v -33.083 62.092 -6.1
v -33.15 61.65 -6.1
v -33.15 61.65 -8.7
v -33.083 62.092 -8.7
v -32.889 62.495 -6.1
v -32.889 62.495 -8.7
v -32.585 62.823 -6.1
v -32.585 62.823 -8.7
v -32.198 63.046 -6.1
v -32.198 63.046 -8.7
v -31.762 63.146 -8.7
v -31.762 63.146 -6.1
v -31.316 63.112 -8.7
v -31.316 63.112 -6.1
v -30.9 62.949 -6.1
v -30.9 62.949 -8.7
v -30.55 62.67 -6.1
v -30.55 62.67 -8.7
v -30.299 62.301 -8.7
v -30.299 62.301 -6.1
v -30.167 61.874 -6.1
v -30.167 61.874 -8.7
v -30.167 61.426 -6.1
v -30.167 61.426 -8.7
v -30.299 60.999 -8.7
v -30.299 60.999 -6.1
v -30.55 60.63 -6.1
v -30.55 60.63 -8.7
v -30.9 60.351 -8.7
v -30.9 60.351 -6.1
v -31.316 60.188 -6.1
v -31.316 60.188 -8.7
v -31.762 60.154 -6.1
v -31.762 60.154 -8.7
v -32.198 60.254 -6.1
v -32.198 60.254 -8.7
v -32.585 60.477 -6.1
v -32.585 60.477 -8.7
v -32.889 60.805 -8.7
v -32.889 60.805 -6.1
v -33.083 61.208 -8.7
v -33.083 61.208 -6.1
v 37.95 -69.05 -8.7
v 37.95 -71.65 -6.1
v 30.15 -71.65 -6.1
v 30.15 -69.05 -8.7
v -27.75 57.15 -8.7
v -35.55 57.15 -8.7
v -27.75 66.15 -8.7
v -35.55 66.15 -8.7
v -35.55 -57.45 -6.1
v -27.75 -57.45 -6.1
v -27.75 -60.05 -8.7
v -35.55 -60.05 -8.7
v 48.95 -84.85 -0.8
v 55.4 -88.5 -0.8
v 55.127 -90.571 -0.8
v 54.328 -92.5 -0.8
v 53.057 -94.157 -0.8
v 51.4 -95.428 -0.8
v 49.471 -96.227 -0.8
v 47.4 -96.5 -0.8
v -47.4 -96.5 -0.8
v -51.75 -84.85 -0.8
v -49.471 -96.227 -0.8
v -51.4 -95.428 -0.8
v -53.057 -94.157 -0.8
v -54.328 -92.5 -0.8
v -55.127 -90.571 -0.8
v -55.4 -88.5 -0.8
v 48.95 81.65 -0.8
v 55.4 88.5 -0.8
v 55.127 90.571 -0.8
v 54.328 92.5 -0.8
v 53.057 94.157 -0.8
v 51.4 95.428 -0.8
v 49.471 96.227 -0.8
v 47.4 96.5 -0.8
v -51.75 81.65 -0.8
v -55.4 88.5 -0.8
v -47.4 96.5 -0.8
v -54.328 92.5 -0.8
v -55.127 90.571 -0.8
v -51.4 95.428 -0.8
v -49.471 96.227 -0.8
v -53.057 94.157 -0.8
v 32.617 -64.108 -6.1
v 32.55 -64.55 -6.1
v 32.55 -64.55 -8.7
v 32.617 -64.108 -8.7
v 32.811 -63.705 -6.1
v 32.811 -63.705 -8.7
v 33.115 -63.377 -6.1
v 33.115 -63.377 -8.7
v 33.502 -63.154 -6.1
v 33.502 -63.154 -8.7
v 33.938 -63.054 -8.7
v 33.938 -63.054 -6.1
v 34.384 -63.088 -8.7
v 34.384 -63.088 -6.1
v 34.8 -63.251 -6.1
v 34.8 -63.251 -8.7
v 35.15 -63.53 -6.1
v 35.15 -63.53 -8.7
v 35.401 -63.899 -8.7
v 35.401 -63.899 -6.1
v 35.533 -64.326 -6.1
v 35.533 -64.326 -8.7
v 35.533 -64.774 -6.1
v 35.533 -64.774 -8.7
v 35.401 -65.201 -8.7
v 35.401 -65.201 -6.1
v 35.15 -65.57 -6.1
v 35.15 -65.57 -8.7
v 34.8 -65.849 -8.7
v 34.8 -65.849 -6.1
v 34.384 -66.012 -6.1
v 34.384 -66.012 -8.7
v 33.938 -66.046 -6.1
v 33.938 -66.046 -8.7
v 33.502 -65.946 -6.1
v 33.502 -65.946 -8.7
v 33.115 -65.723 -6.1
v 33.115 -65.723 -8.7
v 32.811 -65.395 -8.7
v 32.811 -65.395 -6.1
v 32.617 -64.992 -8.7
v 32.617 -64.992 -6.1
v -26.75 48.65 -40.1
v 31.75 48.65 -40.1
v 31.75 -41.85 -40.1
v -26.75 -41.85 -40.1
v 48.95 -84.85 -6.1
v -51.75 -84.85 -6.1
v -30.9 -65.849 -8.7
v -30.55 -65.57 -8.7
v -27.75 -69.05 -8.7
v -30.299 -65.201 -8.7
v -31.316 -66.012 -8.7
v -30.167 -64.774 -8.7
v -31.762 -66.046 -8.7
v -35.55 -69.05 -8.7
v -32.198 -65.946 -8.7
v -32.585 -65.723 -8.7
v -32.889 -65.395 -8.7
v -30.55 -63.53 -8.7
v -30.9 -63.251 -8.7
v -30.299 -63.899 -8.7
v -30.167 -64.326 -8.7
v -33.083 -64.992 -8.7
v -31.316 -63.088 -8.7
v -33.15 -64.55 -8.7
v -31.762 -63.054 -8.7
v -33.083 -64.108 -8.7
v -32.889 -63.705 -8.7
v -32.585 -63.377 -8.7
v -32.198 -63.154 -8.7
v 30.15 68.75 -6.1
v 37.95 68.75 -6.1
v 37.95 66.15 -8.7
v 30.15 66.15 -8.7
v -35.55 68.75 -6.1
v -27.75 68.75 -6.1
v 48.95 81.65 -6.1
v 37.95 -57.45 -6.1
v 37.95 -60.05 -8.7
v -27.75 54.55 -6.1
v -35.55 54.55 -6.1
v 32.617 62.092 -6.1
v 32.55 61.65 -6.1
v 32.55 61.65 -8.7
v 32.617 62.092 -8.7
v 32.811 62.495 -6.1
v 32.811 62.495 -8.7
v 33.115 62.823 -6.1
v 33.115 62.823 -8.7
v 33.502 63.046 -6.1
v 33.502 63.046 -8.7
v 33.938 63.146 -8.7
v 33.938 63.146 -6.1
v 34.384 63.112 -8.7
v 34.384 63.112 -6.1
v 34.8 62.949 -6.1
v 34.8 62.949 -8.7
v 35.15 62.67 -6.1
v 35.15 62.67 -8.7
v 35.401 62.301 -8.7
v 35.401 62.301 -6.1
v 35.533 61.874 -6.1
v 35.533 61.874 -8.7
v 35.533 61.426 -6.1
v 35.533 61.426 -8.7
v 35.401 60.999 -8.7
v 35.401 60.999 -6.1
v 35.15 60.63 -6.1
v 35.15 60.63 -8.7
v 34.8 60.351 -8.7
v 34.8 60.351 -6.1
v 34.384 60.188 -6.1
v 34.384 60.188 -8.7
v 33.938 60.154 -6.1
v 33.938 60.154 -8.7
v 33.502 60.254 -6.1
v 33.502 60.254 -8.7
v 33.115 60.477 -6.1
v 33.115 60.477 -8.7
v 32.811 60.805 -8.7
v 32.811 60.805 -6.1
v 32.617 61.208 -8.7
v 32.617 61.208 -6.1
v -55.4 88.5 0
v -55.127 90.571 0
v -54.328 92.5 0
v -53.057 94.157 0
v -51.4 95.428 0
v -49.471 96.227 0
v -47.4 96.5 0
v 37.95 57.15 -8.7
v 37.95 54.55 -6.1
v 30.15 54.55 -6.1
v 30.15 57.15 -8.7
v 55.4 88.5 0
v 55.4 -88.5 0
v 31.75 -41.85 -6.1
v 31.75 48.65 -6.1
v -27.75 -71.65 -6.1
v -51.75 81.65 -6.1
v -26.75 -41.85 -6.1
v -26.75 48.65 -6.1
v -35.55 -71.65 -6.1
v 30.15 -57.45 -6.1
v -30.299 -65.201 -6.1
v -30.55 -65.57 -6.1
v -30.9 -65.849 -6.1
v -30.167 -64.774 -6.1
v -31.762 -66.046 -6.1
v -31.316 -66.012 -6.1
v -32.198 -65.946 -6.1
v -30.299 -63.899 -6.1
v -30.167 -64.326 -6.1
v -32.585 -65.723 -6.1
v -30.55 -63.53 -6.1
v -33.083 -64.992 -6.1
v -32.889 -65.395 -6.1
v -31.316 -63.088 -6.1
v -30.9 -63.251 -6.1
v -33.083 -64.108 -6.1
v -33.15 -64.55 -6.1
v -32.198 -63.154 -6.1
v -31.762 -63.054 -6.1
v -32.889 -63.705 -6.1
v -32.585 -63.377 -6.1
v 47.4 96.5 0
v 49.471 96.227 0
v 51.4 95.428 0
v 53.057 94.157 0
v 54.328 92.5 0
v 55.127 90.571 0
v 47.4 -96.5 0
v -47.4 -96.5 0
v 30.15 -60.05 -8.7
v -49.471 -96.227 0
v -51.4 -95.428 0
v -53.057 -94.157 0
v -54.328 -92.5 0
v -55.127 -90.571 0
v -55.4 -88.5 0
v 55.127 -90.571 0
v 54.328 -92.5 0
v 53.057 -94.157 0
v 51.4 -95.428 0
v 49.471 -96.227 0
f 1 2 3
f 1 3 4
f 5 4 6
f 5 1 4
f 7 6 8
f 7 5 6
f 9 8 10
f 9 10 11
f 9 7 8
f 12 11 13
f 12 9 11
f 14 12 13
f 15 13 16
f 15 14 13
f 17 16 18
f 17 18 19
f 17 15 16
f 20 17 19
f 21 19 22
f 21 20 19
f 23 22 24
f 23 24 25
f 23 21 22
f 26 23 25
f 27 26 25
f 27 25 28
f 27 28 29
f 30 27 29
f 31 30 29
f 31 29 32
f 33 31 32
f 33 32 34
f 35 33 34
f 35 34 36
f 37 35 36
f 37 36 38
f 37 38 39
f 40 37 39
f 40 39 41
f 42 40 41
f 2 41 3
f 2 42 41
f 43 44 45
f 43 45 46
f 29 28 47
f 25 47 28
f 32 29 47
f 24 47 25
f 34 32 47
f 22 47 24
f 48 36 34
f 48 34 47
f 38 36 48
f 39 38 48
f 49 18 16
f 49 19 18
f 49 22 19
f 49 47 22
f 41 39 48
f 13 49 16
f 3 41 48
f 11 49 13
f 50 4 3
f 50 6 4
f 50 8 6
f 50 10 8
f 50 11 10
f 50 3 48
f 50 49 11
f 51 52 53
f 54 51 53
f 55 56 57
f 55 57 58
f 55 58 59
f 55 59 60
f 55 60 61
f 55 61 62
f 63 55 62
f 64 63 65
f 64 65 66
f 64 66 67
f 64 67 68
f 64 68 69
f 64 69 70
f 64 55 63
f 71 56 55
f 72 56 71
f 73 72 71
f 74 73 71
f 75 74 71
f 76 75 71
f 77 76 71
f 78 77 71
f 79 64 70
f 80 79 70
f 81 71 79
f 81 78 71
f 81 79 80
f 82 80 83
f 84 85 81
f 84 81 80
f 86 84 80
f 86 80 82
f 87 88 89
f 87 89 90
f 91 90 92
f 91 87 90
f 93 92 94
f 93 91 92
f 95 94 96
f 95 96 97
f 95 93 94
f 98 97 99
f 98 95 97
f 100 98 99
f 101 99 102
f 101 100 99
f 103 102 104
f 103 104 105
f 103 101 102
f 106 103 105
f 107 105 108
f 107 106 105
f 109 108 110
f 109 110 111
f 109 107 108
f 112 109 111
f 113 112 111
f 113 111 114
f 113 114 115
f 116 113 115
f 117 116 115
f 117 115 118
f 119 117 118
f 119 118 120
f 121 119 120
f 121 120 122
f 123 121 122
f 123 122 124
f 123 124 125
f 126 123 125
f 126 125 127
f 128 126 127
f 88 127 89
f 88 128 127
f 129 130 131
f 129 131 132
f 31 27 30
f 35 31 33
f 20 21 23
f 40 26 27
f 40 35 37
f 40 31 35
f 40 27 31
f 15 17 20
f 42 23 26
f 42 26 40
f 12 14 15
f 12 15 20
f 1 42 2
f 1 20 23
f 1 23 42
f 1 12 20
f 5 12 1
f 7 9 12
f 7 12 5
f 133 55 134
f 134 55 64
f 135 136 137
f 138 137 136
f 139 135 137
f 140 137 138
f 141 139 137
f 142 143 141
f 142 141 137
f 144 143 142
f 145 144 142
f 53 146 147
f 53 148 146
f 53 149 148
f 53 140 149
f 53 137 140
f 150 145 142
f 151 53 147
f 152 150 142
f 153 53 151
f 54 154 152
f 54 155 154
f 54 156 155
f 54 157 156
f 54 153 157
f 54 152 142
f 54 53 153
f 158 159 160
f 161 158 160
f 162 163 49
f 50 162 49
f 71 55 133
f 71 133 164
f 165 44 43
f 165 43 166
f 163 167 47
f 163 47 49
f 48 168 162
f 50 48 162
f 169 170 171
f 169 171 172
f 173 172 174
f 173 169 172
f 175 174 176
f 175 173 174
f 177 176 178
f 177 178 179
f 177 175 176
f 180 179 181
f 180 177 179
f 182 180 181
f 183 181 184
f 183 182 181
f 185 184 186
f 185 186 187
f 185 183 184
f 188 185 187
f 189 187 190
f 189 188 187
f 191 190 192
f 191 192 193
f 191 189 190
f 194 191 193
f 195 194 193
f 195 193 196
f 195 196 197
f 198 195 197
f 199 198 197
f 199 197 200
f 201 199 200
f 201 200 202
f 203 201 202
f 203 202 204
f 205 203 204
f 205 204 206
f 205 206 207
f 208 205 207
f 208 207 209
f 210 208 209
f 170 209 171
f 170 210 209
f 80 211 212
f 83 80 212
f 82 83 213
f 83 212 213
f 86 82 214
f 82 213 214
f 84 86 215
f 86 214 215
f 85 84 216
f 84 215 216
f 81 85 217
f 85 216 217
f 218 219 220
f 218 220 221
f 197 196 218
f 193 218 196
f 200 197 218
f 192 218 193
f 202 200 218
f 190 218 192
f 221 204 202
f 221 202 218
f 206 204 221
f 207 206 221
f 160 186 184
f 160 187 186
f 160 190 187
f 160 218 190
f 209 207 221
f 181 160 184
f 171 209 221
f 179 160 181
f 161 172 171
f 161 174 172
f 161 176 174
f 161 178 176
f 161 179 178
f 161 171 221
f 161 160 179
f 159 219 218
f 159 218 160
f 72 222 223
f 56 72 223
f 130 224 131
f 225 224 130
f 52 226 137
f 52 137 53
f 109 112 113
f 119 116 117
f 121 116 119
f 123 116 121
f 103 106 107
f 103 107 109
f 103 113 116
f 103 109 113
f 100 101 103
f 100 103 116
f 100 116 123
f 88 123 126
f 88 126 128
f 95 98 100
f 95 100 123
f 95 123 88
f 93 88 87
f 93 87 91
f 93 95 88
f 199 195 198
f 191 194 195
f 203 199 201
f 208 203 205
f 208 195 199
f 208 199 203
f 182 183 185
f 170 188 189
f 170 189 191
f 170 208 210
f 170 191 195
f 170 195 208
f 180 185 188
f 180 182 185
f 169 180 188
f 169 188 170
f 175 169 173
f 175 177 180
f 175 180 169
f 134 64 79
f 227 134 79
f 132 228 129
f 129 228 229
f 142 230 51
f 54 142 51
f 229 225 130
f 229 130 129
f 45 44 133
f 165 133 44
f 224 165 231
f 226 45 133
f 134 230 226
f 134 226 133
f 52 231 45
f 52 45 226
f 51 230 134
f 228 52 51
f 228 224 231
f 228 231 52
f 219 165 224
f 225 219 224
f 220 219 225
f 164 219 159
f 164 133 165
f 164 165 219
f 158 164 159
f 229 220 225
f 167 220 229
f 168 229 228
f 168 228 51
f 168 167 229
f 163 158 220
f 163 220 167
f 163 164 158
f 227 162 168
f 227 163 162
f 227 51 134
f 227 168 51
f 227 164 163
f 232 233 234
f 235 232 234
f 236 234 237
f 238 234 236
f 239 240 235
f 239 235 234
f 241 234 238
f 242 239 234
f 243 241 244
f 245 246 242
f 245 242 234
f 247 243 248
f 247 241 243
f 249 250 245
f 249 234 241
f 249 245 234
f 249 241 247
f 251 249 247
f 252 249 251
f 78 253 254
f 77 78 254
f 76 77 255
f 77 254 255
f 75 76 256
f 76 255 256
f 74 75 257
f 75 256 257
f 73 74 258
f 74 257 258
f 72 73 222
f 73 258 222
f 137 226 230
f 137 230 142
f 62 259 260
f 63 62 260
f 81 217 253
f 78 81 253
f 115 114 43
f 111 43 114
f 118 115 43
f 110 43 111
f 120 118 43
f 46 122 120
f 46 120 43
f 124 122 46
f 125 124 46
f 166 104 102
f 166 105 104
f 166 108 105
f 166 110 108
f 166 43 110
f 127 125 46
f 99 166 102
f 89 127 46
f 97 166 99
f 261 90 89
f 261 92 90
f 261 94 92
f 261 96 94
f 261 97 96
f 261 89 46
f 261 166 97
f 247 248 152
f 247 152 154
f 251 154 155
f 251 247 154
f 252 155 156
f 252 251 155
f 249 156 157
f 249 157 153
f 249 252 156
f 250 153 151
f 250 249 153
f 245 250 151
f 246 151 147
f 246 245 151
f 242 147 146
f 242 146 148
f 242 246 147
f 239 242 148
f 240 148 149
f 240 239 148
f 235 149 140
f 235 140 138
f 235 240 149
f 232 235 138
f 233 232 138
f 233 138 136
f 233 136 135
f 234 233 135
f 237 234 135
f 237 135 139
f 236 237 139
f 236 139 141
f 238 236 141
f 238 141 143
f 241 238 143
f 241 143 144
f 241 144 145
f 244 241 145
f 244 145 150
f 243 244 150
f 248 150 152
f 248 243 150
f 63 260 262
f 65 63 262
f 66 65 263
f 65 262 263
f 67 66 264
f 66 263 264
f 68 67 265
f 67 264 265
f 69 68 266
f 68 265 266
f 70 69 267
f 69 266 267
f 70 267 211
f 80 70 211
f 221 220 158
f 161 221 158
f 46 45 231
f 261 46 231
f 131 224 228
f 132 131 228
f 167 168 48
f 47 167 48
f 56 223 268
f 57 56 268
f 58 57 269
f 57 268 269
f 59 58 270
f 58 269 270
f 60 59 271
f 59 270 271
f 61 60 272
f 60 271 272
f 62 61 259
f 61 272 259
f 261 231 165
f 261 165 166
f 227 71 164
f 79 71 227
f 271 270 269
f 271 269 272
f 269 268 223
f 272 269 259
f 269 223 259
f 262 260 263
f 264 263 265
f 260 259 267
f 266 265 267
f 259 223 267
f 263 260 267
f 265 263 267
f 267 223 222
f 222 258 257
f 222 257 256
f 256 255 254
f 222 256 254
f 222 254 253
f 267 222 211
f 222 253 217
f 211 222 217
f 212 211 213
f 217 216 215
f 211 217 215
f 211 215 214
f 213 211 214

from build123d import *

# Parameters (mm, degrees)
BOSS_EXTRUDE1_DEPTH = 0.8
SKETCH2_W           = 100.7
SKETCH2_H           = 166.5
BOSS_EXTRUDE2_DEPTH = 5.3
SKETCH3_W           = 7.8
SKETCH3_H           = 15
SKETCH3_R           = 1.5
BOSS_EXTRUDE3_DEPTH = 2.6
SKETCH4_W           = 58.5
SKETCH4_H           = 90.5
BOSS_EXTRUDE4_DEPTH = 34
CHAMFER1_SIZE       = 3


with BuildPart() as part:
    # Sketch1 → Boss-Extrude1 (new body)
    with BuildSketch(Plane.XY):
        with BuildLine():
            Line((47.4, -96.5), (-47.4, -96.5))
            ThreePointArc((-47.4, -96.5), (-53.056854249, -94.156854249), (-55.4, -88.5))
            Line((-55.4, -88.5), (-55.4, 88.5))
            ThreePointArc((-55.4, 88.5), (-53.056854249, 94.156854249), (-47.4, 96.5))
            Line((-47.4, 96.5), (47.4, 96.5))
            ThreePointArc((47.4, 96.5), (53.056854249, 94.156854249), (55.4, 88.5))
            Line((55.4, 88.5), (55.4, -88.5))
            ThreePointArc((55.4, -88.5), (53.056854249, -94.156854249), (47.4, -96.5))
        make_face()
    extrude(amount=-BOSS_EXTRUDE1_DEPTH)

    # Sketch2 → Boss-Extrude2 (add)
    with BuildSketch(Plane(origin=(0, 0, -0.8), x_dir=(-1, 0, 0), z_dir=(0, 0, -1))):
        with Locations((1.4, -1.6)):
            Rectangle(SKETCH2_W, SKETCH2_H)
    extrude(amount=BOSS_EXTRUDE2_DEPTH)

    # Sketch3 → Boss-Extrude3 (add)
    # profile 1 of 4: a face of its own
    with BuildSketch(Plane(origin=(0, 0, -6.1), x_dir=(-1, 0, 0), z_dir=(0, 0, -1))):
        with Locations((-34.05, 61.65)):
            Rectangle(SKETCH3_W, SKETCH3_H)
        with Locations((-34.05, 61.65)):
            Circle(SKETCH3_R, mode=Mode.SUBTRACT)
    # profile 2 of 4: a face of its own
    with BuildSketch(Plane(origin=(0, 0, -6.1), x_dir=(-1, 0, 0), z_dir=(0, 0, -1))):
        with Locations((31.65, 61.65)):
            Rectangle(SKETCH3_W, SKETCH3_H)
        with Locations((31.65, 61.65)):
            Circle(SKETCH3_R, mode=Mode.SUBTRACT)
    # profile 3 of 4: a face of its own
    with BuildSketch(Plane(origin=(0, 0, -6.1), x_dir=(-1, 0, 0), z_dir=(0, 0, -1))):
        with Locations((-34.05, -64.55)):
            Rectangle(SKETCH3_W, SKETCH3_H)
        with Locations((-34.05, -64.55)):
            Circle(SKETCH3_R, mode=Mode.SUBTRACT)
    # profile 4 of 4: a face of its own
    with BuildSketch(Plane(origin=(0, 0, -6.1), x_dir=(-1, 0, 0), z_dir=(0, 0, -1))):
        with Locations((31.65, -64.55)):
            Rectangle(SKETCH3_W, SKETCH3_H)
        with Locations((31.65, -64.55)):
            Circle(SKETCH3_R, mode=Mode.SUBTRACT)
    extrude(amount=BOSS_EXTRUDE3_DEPTH)

    # Sketch4 → Boss-Extrude4 (add)
    with BuildSketch(Plane(origin=(0, 0, -6.1), x_dir=(-1, 0, 0), z_dir=(0, 0, -1))):
        with Locations((-2.5, 3.4)):
            Rectangle(SKETCH4_W, SKETCH4_H)
    extrude(amount=BOSS_EXTRUDE4_DEPTH)

    # Chamfer1
    # the kernel refuses this chamfer: 3 mm, written as the material it takes off along each edge
    with BuildSketch(Plane(origin=(-20.034951036, -72.05, -8.7), x_dir=(0, -0.027495876610586775, 0.9996219169112968), z_dir=(-1, 0, 0))) as chamfer1_piece_1_section:
        Polygon((CHAMFER1_SIZE * 0.999621916911, CHAMFER1_SIZE * 0.0274958766106), (-CHAMFER1_SIZE * 0.0274958766106, CHAMFER1_SIZE * 0.999621916911), (0, 0), align=None)
    chamfer1_piece_1 = extrude(amount=23.230097928, mode=Mode.PRIVATE)
    chamfer1_piece_1 = split(chamfer1_piece_1, bisect_by=Plane(origin=(-31.65, -71.03377063, -6.1), z_dir=(0, 0, -1)), keep=Keep.TOP, mode=Mode.PRIVATE)
    add(chamfer1_piece_1, mode=Mode.SUBTRACT)
    with BuildSketch(Plane(origin=(-43.265048964, -57.05, -8.7), x_dir=(0, 0.027495876610586775, 0.9996219169112968), z_dir=(1, 0, 0))) as chamfer1_piece_2_section:
        Polygon((CHAMFER1_SIZE * 0.999621916911, CHAMFER1_SIZE * 0.0274958766106), (-CHAMFER1_SIZE * 0.0274958766106, CHAMFER1_SIZE * 0.999621916911), (0, 0), align=None)
    chamfer1_piece_2 = extrude(amount=23.230097928, mode=Mode.PRIVATE)
    chamfer1_piece_2 = split(chamfer1_piece_2, bisect_by=Plane(origin=(-31.65, -58.06622937, -6.1), z_dir=(0, 0, -1)), keep=Keep.TOP, mode=Mode.PRIVATE)
    add(chamfer1_piece_2, mode=Mode.SUBTRACT)
    with BuildSketch(Plane(origin=(22.434951036, -72.05, -8.7), x_dir=(0, -0.027495876610586775, 0.9996219169112968), z_dir=(1, 0, 0))) as chamfer1_piece_3_section:
        Polygon((CHAMFER1_SIZE * 0.999621916911, -CHAMFER1_SIZE * 0.0274958766106), (-CHAMFER1_SIZE * 0.0274958766106, -CHAMFER1_SIZE * 0.999621916911), (0, 0), align=None)
    chamfer1_piece_3 = extrude(amount=23.230097928, mode=Mode.PRIVATE)
    chamfer1_piece_3 = split(chamfer1_piece_3, bisect_by=Plane(origin=(34.05, -71.03377063, -6.1), z_dir=(0, 0, -1)), keep=Keep.TOP, mode=Mode.PRIVATE)
    add(chamfer1_piece_3, mode=Mode.SUBTRACT)
    with BuildSketch(Plane(origin=(45.665048964, -57.05, -8.7), x_dir=(0, 0.027495876610586775, 0.9996219169112968), z_dir=(-1, 0, 0))) as chamfer1_piece_4_section:
        Polygon((CHAMFER1_SIZE * 0.999621916911, -CHAMFER1_SIZE * 0.0274958766106), (-CHAMFER1_SIZE * 0.0274958766106, -CHAMFER1_SIZE * 0.999621916911), (0, 0), align=None)
    chamfer1_piece_4 = extrude(amount=23.230097928, mode=Mode.PRIVATE)
    chamfer1_piece_4 = split(chamfer1_piece_4, bisect_by=Plane(origin=(34.05, -58.06622937, -6.1), z_dir=(0, 0, -1)), keep=Keep.TOP, mode=Mode.PRIVATE)
    add(chamfer1_piece_4, mode=Mode.SUBTRACT)
    with BuildSketch(Plane(origin=(45.665048964, 54.15, -8.7), x_dir=(0, -0.027495876610586775, 0.9996219169112968), z_dir=(-1, 0, 0))) as chamfer1_piece_5_section:
        Polygon((CHAMFER1_SIZE * 0.999621916911, CHAMFER1_SIZE * 0.0274958766106), (-CHAMFER1_SIZE * 0.0274958766106, CHAMFER1_SIZE * 0.999621916911), (0, 0), align=None)
    chamfer1_piece_5 = extrude(amount=23.230097928, mode=Mode.PRIVATE)
    chamfer1_piece_5 = split(chamfer1_piece_5, bisect_by=Plane(origin=(34.05, 55.16622937, -6.1), z_dir=(0, 0, -1)), keep=Keep.TOP, mode=Mode.PRIVATE)
    add(chamfer1_piece_5, mode=Mode.SUBTRACT)
    with BuildSketch(Plane(origin=(22.434951036, 69.15, -8.7), x_dir=(0, 0.027495876610586775, 0.9996219169112968), z_dir=(1, 0, 0))) as chamfer1_piece_6_section:
        Polygon((CHAMFER1_SIZE * 0.999621916911, CHAMFER1_SIZE * 0.0274958766106), (-CHAMFER1_SIZE * 0.0274958766106, CHAMFER1_SIZE * 0.999621916911), (0, 0), align=None)
    chamfer1_piece_6 = extrude(amount=23.230097928, mode=Mode.PRIVATE)
    chamfer1_piece_6 = split(chamfer1_piece_6, bisect_by=Plane(origin=(34.05, 68.13377063, -6.1), z_dir=(0, 0, -1)), keep=Keep.TOP, mode=Mode.PRIVATE)
    add(chamfer1_piece_6, mode=Mode.SUBTRACT)
    with BuildSketch(Plane(origin=(-43.265048964, 54.15, -8.7), x_dir=(0, -0.027495876610586775, 0.9996219169112968), z_dir=(1, 0, 0))) as chamfer1_piece_7_section:
        Polygon((CHAMFER1_SIZE * 0.999621916911, -CHAMFER1_SIZE * 0.0274958766106), (-CHAMFER1_SIZE * 0.0274958766106, -CHAMFER1_SIZE * 0.999621916911), (0, 0), align=None)
    chamfer1_piece_7 = extrude(amount=23.230097928, mode=Mode.PRIVATE)
    chamfer1_piece_7 = split(chamfer1_piece_7, bisect_by=Plane(origin=(-31.65, 55.16622937, -6.1), z_dir=(0, 0, -1)), keep=Keep.TOP, mode=Mode.PRIVATE)
    add(chamfer1_piece_7, mode=Mode.SUBTRACT)
    with BuildSketch(Plane(origin=(-20.034951036, 69.15, -8.7), x_dir=(0, 0.027495876610586775, 0.9996219169112968), z_dir=(-1, 0, 0))) as chamfer1_piece_8_section:
        Polygon((CHAMFER1_SIZE * 0.999621916911, -CHAMFER1_SIZE * 0.0274958766106), (-CHAMFER1_SIZE * 0.0274958766106, -CHAMFER1_SIZE * 0.999621916911), (0, 0), align=None)
    chamfer1_piece_8 = extrude(amount=23.230097928, mode=Mode.PRIVATE)
    chamfer1_piece_8 = split(chamfer1_piece_8, bisect_by=Plane(origin=(-31.65, 68.13377063, -6.1), z_dir=(0, 0, -1)), keep=Keep.TOP, mode=Mode.PRIVATE)
    add(chamfer1_piece_8, mode=Mode.SUBTRACT)


solid = part.part
